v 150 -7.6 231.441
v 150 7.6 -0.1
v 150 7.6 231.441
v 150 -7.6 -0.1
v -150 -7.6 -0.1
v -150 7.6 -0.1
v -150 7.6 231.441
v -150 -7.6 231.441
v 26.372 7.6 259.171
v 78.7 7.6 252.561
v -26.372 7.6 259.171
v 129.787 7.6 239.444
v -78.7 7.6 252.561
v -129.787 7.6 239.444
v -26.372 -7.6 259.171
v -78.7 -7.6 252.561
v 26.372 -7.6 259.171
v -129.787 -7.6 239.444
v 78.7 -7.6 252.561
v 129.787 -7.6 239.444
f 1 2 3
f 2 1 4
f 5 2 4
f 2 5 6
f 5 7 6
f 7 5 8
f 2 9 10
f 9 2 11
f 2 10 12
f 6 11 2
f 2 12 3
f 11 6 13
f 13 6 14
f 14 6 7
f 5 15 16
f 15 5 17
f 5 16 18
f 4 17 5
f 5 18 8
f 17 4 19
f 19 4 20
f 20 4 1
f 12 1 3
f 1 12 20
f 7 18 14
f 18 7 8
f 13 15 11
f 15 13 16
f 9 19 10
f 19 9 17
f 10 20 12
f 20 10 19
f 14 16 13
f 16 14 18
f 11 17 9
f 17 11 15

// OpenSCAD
module arcdoorhole(door_width=300, door_height=260,wall_thickness=15, wall_color=[0,0,1],wall_alpha=0.3)
{
    $fn = 50;
    r = 1.4 * door_width;
    dx = door_width / 2; 
    
    intersection() {
        color(wall_color,wall_alpha) 
        translate([0,0,door_height/2-0.1])
        cube([door_width, wall_thickness+0.2, door_height],center=true);
        
        color(wall_color,wall_alpha)
        translate([0,0, door_height - r])
        rotate([90,0,0]) 
        cylinder(h=wall_thickness+0.2, r=r, center=true); 
    }
}

// For testing
arcdoorhole();
